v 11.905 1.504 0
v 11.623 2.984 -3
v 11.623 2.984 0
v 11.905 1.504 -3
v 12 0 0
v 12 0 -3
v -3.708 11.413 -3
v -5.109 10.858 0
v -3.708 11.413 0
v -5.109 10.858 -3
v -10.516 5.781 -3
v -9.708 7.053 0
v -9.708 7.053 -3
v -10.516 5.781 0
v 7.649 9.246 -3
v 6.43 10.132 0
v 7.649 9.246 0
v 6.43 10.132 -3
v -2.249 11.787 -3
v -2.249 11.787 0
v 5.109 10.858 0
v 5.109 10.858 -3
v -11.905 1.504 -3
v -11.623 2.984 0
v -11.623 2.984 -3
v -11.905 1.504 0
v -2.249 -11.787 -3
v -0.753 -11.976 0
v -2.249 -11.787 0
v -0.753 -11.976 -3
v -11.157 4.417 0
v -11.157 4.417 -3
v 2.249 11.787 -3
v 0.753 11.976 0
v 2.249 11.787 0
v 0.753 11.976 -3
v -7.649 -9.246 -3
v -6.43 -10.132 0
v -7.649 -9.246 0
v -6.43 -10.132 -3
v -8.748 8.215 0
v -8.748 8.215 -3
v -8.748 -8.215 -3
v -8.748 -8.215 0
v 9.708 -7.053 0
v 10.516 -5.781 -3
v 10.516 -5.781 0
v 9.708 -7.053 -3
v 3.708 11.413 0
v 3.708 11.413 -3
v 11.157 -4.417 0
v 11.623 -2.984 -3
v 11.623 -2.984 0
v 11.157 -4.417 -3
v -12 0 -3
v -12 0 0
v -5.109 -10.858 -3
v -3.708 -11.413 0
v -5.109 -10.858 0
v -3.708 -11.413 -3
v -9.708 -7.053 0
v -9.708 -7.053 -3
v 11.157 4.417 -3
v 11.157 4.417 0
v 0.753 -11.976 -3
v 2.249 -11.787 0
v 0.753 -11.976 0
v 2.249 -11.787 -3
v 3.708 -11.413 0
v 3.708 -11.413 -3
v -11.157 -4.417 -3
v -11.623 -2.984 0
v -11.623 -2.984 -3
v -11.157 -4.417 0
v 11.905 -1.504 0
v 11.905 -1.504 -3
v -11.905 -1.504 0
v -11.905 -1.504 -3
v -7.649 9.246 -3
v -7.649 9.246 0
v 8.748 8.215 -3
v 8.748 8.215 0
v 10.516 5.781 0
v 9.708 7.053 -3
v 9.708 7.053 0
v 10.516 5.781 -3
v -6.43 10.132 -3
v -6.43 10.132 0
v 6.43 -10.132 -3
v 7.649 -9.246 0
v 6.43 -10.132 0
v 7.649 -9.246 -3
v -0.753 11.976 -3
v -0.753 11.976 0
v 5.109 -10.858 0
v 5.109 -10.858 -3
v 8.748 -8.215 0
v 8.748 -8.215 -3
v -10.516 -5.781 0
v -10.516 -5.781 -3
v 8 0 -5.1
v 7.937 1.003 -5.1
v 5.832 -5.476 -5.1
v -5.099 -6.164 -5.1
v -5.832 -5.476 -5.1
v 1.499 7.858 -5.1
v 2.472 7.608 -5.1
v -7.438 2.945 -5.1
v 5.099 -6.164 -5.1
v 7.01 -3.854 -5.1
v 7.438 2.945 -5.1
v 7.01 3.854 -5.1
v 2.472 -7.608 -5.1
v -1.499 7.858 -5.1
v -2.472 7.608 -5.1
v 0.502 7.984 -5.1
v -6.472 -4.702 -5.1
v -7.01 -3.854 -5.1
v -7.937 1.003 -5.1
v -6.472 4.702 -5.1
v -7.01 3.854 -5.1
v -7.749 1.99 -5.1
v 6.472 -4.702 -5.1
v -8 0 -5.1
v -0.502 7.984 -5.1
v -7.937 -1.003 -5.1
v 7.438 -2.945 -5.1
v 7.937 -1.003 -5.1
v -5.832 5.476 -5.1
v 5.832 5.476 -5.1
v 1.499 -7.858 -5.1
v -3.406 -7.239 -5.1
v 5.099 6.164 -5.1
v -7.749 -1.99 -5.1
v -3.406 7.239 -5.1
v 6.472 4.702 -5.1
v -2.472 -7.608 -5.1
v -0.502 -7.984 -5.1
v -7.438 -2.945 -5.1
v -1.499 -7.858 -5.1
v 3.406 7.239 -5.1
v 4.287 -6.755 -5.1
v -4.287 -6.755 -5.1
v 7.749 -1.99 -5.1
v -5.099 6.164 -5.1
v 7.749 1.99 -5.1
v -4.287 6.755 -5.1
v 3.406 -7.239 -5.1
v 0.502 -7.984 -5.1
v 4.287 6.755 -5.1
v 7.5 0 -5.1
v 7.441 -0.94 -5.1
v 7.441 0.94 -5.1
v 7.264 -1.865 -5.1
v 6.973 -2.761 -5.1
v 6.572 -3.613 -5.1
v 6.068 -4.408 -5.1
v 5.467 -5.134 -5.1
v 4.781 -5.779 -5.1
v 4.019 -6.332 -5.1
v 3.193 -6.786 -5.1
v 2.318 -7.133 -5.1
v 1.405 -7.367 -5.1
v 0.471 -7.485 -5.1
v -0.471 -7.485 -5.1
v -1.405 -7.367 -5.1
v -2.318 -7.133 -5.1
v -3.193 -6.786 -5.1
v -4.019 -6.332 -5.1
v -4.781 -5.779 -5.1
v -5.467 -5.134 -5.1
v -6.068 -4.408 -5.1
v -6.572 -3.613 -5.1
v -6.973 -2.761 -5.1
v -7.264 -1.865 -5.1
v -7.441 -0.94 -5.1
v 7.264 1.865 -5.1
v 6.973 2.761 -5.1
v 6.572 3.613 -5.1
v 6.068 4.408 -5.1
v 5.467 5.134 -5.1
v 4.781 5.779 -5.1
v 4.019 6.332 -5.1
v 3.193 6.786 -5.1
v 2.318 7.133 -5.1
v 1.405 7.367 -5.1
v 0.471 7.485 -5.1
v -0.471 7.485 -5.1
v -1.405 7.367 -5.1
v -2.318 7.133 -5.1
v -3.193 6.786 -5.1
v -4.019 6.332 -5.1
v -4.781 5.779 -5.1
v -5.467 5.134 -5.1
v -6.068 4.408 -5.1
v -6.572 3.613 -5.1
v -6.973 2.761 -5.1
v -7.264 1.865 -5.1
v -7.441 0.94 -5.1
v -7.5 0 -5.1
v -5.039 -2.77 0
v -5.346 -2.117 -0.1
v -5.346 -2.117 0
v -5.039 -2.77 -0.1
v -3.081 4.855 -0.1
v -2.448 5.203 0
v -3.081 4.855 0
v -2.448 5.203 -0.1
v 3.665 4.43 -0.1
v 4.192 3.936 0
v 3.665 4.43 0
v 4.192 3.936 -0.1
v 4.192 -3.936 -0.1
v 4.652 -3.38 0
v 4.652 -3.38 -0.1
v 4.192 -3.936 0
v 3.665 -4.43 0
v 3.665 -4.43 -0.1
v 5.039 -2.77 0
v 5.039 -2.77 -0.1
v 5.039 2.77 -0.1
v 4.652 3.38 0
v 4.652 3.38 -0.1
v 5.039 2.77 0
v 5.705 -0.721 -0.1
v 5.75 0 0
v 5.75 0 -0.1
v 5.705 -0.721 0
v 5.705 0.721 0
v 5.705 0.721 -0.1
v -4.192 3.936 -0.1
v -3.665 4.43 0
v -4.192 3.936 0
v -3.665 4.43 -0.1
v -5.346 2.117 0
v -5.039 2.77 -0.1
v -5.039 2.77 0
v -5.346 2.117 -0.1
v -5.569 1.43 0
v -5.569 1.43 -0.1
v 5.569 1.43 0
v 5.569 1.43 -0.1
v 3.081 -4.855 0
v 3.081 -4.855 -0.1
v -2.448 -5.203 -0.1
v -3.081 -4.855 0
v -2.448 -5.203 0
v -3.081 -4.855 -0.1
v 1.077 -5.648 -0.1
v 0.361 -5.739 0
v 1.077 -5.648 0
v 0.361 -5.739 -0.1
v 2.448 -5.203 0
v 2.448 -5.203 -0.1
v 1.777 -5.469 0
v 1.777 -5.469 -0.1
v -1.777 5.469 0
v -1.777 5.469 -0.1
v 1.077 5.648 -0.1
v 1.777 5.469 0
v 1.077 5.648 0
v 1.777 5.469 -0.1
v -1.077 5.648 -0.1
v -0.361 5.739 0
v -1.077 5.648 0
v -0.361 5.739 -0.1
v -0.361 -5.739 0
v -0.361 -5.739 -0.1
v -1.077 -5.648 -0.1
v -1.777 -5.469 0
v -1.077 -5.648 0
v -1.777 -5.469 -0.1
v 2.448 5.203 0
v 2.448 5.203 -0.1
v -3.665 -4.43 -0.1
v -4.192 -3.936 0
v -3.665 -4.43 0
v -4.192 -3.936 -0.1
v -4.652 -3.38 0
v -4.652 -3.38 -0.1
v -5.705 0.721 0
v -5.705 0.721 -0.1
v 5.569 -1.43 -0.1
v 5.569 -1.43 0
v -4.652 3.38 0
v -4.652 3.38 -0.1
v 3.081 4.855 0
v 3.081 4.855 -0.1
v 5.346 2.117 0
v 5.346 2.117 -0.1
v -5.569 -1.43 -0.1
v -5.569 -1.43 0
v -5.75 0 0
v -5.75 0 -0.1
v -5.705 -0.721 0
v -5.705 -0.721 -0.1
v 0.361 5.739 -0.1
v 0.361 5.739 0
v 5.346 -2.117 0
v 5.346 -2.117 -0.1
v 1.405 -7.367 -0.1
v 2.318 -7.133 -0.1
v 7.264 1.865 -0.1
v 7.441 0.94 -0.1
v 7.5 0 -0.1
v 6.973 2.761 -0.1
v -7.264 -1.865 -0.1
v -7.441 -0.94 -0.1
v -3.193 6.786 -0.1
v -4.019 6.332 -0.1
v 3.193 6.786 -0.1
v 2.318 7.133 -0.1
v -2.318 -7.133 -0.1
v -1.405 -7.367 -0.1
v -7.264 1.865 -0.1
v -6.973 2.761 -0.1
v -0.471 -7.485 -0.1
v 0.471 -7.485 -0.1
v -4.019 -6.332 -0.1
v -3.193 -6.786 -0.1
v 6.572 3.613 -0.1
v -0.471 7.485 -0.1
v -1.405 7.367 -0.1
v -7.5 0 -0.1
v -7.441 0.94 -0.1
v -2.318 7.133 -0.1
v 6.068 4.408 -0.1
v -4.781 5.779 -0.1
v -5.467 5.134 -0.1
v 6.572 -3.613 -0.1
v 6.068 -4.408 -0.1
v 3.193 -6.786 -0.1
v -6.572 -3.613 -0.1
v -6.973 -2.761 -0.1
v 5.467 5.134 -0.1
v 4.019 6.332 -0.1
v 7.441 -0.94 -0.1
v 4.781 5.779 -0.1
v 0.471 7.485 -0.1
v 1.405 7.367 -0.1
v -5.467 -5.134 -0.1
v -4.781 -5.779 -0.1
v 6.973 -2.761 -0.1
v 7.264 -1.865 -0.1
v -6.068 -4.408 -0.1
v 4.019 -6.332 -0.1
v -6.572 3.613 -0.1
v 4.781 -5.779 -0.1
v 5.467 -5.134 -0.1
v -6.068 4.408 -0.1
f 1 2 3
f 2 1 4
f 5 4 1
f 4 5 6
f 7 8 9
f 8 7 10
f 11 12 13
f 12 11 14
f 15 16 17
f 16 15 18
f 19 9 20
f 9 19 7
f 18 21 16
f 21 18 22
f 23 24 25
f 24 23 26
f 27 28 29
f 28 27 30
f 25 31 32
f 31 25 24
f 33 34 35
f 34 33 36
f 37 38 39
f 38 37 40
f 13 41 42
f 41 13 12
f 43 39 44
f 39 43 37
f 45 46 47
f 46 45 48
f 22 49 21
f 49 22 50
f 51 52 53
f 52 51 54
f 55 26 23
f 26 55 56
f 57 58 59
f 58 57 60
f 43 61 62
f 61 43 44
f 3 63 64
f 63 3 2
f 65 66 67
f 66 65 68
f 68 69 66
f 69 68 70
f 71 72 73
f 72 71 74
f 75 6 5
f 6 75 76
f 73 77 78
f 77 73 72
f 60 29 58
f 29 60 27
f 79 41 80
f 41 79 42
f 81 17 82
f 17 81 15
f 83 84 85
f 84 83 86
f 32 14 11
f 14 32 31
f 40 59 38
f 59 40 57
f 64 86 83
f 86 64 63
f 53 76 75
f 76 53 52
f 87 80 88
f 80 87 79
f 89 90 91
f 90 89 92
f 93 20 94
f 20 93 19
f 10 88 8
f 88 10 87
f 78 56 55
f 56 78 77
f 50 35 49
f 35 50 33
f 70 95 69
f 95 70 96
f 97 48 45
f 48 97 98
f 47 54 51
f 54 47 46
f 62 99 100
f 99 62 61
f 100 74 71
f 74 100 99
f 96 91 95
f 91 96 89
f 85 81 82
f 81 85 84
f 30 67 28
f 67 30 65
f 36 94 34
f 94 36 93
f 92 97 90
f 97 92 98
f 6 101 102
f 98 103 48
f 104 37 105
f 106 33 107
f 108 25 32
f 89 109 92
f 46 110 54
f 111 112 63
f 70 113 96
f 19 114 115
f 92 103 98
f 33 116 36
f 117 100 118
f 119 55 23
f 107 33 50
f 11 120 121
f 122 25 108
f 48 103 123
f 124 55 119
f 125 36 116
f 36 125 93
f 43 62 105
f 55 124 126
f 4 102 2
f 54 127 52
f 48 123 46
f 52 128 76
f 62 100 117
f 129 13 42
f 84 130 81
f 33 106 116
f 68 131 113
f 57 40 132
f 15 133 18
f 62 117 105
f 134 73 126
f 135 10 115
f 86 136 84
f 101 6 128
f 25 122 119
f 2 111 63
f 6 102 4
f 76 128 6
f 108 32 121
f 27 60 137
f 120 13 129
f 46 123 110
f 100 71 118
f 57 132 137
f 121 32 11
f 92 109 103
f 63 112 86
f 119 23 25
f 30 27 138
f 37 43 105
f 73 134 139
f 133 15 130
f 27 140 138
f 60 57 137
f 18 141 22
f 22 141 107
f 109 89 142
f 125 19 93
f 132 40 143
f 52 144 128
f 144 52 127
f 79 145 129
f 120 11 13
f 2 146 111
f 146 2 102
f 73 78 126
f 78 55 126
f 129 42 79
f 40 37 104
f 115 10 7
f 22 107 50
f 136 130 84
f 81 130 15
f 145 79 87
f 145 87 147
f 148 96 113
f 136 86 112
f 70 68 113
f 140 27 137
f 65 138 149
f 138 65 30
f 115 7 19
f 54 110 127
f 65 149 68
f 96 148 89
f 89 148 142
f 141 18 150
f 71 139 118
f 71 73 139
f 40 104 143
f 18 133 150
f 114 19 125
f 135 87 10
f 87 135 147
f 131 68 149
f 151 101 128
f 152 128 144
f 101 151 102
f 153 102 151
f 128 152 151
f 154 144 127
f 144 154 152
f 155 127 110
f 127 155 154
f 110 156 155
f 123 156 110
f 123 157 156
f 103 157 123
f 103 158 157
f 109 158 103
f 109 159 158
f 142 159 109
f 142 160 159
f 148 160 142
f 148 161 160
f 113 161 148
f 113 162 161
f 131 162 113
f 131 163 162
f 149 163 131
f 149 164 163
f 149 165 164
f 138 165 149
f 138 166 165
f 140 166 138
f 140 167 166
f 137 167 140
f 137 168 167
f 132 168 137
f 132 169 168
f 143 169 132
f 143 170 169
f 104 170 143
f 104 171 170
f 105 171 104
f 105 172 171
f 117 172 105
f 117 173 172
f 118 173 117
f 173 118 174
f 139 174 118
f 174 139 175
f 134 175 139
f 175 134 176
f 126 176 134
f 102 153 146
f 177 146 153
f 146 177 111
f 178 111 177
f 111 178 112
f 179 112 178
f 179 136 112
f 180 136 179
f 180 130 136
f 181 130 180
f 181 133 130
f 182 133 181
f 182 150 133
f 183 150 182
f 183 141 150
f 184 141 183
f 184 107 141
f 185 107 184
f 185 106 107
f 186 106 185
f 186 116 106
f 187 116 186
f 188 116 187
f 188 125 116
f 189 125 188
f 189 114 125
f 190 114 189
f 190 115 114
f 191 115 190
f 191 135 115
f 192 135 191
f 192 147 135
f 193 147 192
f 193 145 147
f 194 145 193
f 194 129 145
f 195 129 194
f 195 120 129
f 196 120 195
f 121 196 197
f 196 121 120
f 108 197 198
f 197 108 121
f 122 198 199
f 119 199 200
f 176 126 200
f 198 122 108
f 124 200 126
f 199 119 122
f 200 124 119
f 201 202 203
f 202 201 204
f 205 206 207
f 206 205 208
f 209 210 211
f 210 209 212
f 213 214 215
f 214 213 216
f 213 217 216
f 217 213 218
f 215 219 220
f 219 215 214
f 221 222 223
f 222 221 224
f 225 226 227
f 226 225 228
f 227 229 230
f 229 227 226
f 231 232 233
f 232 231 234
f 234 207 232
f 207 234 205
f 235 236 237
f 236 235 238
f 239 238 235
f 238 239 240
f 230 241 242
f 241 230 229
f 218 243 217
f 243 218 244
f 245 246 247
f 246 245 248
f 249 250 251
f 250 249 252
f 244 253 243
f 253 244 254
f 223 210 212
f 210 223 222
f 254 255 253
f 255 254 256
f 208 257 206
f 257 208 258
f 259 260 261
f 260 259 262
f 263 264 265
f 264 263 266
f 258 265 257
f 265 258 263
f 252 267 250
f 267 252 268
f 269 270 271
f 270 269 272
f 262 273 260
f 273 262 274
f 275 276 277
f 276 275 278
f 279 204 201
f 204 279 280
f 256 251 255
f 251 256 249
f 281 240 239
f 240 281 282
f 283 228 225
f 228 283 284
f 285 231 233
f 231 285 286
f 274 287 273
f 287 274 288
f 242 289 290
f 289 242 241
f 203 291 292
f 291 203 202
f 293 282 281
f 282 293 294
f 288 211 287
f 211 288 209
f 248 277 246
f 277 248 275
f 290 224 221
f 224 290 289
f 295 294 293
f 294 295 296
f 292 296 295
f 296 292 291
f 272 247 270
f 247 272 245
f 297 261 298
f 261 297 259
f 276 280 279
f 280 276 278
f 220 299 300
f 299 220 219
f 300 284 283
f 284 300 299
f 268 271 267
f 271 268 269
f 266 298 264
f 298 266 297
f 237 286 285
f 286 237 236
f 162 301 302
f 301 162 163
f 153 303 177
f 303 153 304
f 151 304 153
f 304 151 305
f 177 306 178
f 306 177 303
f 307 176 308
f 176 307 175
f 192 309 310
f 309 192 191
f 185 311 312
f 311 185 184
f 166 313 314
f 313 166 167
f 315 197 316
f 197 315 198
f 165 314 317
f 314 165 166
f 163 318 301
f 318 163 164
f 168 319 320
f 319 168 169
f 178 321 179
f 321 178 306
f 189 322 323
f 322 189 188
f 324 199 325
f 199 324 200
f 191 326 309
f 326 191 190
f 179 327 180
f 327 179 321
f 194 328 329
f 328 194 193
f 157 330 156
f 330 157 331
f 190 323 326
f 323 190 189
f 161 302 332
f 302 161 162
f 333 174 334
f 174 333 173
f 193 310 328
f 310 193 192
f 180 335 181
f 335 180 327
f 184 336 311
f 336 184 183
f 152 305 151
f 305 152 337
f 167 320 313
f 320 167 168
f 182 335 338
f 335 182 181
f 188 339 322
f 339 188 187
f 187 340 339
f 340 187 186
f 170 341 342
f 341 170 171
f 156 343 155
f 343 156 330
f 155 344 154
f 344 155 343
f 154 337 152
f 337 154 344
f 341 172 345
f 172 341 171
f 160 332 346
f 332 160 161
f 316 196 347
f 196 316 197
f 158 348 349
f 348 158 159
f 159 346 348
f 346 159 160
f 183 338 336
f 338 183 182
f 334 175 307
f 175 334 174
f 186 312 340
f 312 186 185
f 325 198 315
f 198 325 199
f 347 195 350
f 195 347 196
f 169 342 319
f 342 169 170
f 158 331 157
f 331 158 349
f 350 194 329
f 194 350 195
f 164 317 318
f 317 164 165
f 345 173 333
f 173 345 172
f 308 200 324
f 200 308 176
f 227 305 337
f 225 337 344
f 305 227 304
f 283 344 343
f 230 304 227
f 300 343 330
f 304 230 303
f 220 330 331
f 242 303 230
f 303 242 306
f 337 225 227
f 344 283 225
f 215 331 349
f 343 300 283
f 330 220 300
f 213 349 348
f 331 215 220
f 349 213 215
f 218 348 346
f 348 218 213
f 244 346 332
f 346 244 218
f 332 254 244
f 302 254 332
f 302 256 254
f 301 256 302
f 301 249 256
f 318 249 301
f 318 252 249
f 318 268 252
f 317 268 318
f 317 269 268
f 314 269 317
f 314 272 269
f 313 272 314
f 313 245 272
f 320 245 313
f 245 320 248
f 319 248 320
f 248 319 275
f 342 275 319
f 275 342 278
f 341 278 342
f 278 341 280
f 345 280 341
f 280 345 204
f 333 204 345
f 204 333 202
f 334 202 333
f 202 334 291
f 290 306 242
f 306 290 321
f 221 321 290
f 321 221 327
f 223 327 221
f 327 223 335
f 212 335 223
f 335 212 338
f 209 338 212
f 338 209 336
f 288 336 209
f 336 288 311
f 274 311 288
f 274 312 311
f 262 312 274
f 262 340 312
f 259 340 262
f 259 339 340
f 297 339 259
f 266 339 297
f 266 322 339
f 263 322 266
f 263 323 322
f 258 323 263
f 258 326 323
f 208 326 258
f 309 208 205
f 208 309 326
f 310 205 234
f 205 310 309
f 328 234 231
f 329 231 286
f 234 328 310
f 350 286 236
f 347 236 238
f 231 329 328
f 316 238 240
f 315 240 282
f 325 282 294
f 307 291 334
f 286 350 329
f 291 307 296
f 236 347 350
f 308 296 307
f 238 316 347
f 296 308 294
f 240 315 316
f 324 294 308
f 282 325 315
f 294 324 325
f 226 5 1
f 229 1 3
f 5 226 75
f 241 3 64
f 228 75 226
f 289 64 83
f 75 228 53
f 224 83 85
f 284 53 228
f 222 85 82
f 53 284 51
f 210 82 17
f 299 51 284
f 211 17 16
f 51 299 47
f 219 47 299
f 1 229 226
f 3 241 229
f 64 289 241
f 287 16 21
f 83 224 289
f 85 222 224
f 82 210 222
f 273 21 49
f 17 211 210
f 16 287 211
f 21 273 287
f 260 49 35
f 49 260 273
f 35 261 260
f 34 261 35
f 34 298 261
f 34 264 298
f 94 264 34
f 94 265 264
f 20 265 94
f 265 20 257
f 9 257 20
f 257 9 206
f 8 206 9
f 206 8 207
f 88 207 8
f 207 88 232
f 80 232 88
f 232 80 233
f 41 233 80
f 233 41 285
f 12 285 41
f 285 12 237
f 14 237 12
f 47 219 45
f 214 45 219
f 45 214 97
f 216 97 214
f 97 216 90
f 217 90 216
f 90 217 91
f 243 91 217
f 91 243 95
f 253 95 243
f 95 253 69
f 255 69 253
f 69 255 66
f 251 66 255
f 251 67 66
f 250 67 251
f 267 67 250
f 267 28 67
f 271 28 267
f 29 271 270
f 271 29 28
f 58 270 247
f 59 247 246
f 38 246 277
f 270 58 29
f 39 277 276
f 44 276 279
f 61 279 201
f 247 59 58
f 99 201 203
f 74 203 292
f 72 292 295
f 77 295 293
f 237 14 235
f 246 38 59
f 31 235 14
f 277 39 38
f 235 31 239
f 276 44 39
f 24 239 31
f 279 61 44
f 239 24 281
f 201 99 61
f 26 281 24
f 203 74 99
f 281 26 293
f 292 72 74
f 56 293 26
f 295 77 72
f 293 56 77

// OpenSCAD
$fn = 50;


difference() {
	union() {
		translate(v = [0, 0, -3.0000000000]) {
			cylinder(h = 6, r = 12.0000000000);
		}
		translate(v = [0, 0, 3.0000000000]) {
			cylinder(h = 2.1000000000, r1 = 12.0000000000, r2 = 8.0000000000);
		}
		translate(v = [0, 0, -5.1000000000]) {
			cylinder(h = 2.1000000000, r1 = 8.0000000000, r2 = 12.0000000000);
		}
	}
	union() {
		translate(v = [0, 0, -100.0000000000]) {
			cylinder(h = 200, r = 5);
		}
		translate(v = [0, 0, 2.6000000000]) {
			translate(v = [0, 0, -2.5000000000]) {
				union() {
					difference() {
						#cylinder(h = 5, r = 7.5000000000);
						#cylinder(h = 5, r = 3.0000000000);
					}
					difference() {
						#translate(v = [0, 0, -50]) {
							cylinder(h = 100, r = 5.7500000000);
						}
					}
				}
			}
		}
		translate(v = [0, 0, -2.6000000000]) {
			translate(v = [0, 0, -2.5000000000]) {
				union() {
					difference() {
						#cylinder(h = 5, r = 7.5000000000);
						#cylinder(h = 5, r = 3.0000000000);
					}
					difference() {
						#translate(v = [0, 0, -50]) {
							cylinder(h = 100, r = 5.7500000000);
						}
					}
				}
			}
		}
		translate(v = [-250.0000000000, -250.0000000000, 0]) {
			cube(size = [500, 500, 500]);
		}
		translate(v = [-250.0000000000, -250.0000000000, 0]) {
			cube(size = [500, 500, 500]);
		}
		translate(v = [-250.0000000000, -250.0000000000, 0]) {
			cube(size = [500, 500, 500]);
		}
	}
}
